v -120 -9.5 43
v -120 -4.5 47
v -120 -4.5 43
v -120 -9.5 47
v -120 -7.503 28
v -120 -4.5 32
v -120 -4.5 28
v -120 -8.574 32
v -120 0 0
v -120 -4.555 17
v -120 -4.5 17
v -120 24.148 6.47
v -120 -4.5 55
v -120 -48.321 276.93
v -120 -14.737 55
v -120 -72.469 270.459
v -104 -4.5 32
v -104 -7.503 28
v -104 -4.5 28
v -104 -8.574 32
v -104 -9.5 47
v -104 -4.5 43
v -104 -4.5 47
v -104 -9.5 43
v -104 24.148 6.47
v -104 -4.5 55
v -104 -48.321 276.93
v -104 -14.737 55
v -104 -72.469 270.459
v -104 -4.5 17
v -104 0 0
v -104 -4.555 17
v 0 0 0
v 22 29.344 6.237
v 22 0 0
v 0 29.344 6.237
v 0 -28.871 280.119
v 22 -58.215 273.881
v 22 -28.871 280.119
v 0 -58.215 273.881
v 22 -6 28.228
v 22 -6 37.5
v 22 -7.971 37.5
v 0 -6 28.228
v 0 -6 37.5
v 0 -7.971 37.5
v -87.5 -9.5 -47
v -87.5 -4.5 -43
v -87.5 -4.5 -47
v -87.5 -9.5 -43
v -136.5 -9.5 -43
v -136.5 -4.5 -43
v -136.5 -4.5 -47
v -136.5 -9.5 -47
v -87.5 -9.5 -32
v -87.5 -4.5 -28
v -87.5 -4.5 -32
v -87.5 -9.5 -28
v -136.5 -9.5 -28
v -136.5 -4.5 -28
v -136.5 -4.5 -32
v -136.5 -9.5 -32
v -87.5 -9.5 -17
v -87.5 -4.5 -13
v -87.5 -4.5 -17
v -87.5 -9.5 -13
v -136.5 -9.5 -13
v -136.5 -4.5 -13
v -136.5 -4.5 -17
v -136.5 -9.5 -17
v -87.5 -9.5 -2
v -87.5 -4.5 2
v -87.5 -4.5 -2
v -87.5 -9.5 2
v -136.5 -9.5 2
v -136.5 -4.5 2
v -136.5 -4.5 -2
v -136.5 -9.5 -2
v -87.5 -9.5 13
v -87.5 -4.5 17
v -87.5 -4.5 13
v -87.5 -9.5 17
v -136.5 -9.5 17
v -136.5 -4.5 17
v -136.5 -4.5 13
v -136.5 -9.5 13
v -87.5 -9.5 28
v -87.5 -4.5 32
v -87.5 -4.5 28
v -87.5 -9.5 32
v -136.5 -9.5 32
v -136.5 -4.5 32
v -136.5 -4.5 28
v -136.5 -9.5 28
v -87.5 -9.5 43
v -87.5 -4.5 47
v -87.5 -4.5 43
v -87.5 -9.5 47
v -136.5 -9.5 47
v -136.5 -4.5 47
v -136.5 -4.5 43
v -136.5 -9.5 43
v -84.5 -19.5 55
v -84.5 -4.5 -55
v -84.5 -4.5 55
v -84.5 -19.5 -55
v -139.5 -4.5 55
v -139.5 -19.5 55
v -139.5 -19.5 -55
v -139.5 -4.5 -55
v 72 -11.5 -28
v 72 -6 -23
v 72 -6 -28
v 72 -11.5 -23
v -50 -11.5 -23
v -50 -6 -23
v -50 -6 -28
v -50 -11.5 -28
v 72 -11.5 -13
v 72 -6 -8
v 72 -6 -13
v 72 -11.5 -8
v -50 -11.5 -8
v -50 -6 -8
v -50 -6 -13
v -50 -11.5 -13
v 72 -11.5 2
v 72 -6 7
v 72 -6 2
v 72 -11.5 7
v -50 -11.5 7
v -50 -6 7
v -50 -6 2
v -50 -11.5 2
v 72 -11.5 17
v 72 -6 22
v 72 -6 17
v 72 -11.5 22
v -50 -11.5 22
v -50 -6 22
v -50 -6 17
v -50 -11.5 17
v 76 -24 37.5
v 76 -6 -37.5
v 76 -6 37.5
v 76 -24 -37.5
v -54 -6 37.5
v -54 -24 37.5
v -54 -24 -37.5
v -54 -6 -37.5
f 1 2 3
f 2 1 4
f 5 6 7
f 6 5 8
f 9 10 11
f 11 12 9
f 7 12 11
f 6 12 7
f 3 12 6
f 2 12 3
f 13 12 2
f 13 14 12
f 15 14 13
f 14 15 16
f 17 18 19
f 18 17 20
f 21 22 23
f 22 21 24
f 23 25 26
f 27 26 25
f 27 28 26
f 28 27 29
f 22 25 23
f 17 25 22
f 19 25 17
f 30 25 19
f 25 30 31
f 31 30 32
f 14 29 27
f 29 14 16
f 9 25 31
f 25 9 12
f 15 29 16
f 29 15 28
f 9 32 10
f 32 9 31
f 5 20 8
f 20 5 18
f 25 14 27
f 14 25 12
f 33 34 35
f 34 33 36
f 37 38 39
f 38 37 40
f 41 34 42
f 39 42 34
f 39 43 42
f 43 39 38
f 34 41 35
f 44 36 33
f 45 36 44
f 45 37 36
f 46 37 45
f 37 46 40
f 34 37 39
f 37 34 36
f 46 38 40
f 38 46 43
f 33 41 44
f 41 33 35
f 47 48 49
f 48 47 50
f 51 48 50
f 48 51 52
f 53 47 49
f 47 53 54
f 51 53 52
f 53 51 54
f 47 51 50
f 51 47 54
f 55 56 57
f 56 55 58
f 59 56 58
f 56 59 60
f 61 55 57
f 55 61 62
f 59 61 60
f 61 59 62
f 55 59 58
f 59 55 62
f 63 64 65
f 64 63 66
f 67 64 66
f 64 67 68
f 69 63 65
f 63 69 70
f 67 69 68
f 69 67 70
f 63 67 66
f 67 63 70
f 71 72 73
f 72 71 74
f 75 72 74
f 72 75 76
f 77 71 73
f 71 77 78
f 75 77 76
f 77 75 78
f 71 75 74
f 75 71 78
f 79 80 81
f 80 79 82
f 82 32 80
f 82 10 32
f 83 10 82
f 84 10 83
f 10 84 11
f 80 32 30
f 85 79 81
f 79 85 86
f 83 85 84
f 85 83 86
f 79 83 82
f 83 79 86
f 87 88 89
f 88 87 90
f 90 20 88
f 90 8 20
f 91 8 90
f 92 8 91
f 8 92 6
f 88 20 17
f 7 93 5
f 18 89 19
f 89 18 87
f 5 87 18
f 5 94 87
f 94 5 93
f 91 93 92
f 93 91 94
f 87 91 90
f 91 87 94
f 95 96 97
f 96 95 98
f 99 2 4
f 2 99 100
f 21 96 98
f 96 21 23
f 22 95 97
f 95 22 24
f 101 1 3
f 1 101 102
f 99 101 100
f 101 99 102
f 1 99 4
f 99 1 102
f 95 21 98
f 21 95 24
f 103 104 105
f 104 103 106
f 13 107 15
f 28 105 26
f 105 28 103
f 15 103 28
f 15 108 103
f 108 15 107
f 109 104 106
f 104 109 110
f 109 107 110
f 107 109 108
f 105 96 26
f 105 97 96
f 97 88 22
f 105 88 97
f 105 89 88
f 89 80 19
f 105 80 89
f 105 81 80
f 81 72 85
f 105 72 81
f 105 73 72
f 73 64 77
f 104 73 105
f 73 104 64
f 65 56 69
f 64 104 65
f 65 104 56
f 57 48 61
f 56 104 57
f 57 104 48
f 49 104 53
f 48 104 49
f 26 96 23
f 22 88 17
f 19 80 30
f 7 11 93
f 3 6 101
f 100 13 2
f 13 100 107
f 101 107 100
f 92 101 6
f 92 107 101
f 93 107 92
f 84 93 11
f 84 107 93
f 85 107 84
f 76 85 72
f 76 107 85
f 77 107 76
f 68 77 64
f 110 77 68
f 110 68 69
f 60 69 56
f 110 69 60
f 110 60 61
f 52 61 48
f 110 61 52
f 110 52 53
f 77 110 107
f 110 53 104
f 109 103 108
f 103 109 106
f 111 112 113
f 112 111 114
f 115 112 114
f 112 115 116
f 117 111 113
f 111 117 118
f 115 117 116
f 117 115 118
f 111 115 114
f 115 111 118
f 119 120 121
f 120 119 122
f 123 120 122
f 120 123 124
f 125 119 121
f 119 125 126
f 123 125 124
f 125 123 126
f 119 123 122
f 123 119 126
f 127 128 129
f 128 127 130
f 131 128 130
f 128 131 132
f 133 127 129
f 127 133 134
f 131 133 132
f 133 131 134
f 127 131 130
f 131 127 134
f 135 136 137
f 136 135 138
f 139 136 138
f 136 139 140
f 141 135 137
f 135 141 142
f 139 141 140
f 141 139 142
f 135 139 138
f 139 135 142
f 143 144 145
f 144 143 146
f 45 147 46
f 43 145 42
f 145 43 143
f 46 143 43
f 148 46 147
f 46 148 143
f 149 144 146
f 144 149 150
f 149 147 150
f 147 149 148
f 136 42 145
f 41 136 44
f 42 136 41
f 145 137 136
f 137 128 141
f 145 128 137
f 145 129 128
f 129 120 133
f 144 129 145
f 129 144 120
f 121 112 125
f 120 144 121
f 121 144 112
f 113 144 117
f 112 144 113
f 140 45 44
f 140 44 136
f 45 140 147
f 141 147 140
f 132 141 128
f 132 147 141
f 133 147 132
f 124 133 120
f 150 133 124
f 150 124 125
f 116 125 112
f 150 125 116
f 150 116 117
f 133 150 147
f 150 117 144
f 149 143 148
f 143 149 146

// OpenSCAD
// ====================================================================================
// REVOLUTIONARY TECHNOLOGY COMPANY & UNIVERSITY OF WASHINGTON DEPARTMENT OF PHYSICS
// Subsystem: silverado_md_pedals.scad (Parametric High-Traction Fleet Pedal Box)
// Core Application: 2027-2028 Silverado MD Commercial Crew-Cab Driver Interface
// ====================================================================================

$fn = 120; // High-precision CNC stamping and overmold tooling depth

// --- Drivetrain Selector ---
// 1 = 3-Pedal Manual Array, 2 = 2-Pedal Commercial Automatic Array
TRUCK_DRIVETRAIN_MODE = 2;

// --- Physical Dimensional Parameters (mm) ---
pedal_arm_length   = 280.00;           // Extended commercial lever throw depth
throttle_pad_w     = 55.00;            // Sized to match 2027 Silverado High Country HD
throttle_pad_h     = 110.00;
brake_pad_w        = (TRUCK_DRIVETRAIN_MODE == 1) ? 65.00 : 130.00; // Wide-pad automatic brake profile
brake_pad_h        = 75.00;
lug_depth_mm       = 5.00;              // Deep anti-slip non-slip rubber traction lugs

module stamped_lever_arms() {
    echo(str("COMPILING SILVERADO MD PEDAL MODULE: ", (TRUCK_DRIVETRAIN_MODE == 1) ? "3_PEDAL_MANUAL_SET" : "2_PEDAL_AUTOMATIC_SET"));
    // Heavy-gauge steel structural support arms mounting to the firewall brace
    color("DimGrey") {
        // Throttle Arm Lever
        translate([-120, 0, 0]) rotate([15, 0, 0]) cube([16, 25, pedal_arm_length]);
        // Brake Arm Lever
        translate([0, 0, 0]) rotate([12, 0, 0]) cube([22, 30, pedal_arm_length]);
        // Clutch Arm Lever (Compiled exclusively for manual configurations)
        if (TRUCK_DRIVETRAIN_MODE == 1) {
            translate([120, 0, 0]) rotate([12, 0, 0]) cube([16, 25, pedal_arm_length]);
        }
    }
}

module non_slip_rubber_pads() {
    // 100% Tree-Harvested vulcanized rubber faces containing 5mm traction lugs
    color("Black") {
        // 1. Throttle Pedal Pad Face
        translate([-120 + 8, -12, 0])
            difference() {
                cube([throttle_pad_w, 15.0, throttle_pad_h], center=true);
                // Cuts deep vertical traction slots into the face matrix
                for (z = [-throttle_pad_h/2 + 10 : 15 : throttle_pad_h/2 - 10]) {
                    translate([0, 6.0, z]) cube([throttle_pad_w - 6, lug_depth_mm + 2, 4.0], center=true);
                }
            }
            
        // 2. Commercial Brake Pedal Pad Face
        translate([11, -15, 0])
            difference() {
                cube([brake_pad_w, 18.0, brake_pad_h], center=true);
                for (z = [-brake_pad_h/2 + 12 : 15 : brake_pad_h/2 - 12]) {
                    translate([0, 7.0, z]) cube([brake_pad_w - 8, lug_depth_mm + 2, 5.0], center=true);
                }
            }
    }
}

// --- Composite Pedal System Instantiation ---
union() {
    stamped_lever_arms();
    non_slip_rubber_pads();
}
